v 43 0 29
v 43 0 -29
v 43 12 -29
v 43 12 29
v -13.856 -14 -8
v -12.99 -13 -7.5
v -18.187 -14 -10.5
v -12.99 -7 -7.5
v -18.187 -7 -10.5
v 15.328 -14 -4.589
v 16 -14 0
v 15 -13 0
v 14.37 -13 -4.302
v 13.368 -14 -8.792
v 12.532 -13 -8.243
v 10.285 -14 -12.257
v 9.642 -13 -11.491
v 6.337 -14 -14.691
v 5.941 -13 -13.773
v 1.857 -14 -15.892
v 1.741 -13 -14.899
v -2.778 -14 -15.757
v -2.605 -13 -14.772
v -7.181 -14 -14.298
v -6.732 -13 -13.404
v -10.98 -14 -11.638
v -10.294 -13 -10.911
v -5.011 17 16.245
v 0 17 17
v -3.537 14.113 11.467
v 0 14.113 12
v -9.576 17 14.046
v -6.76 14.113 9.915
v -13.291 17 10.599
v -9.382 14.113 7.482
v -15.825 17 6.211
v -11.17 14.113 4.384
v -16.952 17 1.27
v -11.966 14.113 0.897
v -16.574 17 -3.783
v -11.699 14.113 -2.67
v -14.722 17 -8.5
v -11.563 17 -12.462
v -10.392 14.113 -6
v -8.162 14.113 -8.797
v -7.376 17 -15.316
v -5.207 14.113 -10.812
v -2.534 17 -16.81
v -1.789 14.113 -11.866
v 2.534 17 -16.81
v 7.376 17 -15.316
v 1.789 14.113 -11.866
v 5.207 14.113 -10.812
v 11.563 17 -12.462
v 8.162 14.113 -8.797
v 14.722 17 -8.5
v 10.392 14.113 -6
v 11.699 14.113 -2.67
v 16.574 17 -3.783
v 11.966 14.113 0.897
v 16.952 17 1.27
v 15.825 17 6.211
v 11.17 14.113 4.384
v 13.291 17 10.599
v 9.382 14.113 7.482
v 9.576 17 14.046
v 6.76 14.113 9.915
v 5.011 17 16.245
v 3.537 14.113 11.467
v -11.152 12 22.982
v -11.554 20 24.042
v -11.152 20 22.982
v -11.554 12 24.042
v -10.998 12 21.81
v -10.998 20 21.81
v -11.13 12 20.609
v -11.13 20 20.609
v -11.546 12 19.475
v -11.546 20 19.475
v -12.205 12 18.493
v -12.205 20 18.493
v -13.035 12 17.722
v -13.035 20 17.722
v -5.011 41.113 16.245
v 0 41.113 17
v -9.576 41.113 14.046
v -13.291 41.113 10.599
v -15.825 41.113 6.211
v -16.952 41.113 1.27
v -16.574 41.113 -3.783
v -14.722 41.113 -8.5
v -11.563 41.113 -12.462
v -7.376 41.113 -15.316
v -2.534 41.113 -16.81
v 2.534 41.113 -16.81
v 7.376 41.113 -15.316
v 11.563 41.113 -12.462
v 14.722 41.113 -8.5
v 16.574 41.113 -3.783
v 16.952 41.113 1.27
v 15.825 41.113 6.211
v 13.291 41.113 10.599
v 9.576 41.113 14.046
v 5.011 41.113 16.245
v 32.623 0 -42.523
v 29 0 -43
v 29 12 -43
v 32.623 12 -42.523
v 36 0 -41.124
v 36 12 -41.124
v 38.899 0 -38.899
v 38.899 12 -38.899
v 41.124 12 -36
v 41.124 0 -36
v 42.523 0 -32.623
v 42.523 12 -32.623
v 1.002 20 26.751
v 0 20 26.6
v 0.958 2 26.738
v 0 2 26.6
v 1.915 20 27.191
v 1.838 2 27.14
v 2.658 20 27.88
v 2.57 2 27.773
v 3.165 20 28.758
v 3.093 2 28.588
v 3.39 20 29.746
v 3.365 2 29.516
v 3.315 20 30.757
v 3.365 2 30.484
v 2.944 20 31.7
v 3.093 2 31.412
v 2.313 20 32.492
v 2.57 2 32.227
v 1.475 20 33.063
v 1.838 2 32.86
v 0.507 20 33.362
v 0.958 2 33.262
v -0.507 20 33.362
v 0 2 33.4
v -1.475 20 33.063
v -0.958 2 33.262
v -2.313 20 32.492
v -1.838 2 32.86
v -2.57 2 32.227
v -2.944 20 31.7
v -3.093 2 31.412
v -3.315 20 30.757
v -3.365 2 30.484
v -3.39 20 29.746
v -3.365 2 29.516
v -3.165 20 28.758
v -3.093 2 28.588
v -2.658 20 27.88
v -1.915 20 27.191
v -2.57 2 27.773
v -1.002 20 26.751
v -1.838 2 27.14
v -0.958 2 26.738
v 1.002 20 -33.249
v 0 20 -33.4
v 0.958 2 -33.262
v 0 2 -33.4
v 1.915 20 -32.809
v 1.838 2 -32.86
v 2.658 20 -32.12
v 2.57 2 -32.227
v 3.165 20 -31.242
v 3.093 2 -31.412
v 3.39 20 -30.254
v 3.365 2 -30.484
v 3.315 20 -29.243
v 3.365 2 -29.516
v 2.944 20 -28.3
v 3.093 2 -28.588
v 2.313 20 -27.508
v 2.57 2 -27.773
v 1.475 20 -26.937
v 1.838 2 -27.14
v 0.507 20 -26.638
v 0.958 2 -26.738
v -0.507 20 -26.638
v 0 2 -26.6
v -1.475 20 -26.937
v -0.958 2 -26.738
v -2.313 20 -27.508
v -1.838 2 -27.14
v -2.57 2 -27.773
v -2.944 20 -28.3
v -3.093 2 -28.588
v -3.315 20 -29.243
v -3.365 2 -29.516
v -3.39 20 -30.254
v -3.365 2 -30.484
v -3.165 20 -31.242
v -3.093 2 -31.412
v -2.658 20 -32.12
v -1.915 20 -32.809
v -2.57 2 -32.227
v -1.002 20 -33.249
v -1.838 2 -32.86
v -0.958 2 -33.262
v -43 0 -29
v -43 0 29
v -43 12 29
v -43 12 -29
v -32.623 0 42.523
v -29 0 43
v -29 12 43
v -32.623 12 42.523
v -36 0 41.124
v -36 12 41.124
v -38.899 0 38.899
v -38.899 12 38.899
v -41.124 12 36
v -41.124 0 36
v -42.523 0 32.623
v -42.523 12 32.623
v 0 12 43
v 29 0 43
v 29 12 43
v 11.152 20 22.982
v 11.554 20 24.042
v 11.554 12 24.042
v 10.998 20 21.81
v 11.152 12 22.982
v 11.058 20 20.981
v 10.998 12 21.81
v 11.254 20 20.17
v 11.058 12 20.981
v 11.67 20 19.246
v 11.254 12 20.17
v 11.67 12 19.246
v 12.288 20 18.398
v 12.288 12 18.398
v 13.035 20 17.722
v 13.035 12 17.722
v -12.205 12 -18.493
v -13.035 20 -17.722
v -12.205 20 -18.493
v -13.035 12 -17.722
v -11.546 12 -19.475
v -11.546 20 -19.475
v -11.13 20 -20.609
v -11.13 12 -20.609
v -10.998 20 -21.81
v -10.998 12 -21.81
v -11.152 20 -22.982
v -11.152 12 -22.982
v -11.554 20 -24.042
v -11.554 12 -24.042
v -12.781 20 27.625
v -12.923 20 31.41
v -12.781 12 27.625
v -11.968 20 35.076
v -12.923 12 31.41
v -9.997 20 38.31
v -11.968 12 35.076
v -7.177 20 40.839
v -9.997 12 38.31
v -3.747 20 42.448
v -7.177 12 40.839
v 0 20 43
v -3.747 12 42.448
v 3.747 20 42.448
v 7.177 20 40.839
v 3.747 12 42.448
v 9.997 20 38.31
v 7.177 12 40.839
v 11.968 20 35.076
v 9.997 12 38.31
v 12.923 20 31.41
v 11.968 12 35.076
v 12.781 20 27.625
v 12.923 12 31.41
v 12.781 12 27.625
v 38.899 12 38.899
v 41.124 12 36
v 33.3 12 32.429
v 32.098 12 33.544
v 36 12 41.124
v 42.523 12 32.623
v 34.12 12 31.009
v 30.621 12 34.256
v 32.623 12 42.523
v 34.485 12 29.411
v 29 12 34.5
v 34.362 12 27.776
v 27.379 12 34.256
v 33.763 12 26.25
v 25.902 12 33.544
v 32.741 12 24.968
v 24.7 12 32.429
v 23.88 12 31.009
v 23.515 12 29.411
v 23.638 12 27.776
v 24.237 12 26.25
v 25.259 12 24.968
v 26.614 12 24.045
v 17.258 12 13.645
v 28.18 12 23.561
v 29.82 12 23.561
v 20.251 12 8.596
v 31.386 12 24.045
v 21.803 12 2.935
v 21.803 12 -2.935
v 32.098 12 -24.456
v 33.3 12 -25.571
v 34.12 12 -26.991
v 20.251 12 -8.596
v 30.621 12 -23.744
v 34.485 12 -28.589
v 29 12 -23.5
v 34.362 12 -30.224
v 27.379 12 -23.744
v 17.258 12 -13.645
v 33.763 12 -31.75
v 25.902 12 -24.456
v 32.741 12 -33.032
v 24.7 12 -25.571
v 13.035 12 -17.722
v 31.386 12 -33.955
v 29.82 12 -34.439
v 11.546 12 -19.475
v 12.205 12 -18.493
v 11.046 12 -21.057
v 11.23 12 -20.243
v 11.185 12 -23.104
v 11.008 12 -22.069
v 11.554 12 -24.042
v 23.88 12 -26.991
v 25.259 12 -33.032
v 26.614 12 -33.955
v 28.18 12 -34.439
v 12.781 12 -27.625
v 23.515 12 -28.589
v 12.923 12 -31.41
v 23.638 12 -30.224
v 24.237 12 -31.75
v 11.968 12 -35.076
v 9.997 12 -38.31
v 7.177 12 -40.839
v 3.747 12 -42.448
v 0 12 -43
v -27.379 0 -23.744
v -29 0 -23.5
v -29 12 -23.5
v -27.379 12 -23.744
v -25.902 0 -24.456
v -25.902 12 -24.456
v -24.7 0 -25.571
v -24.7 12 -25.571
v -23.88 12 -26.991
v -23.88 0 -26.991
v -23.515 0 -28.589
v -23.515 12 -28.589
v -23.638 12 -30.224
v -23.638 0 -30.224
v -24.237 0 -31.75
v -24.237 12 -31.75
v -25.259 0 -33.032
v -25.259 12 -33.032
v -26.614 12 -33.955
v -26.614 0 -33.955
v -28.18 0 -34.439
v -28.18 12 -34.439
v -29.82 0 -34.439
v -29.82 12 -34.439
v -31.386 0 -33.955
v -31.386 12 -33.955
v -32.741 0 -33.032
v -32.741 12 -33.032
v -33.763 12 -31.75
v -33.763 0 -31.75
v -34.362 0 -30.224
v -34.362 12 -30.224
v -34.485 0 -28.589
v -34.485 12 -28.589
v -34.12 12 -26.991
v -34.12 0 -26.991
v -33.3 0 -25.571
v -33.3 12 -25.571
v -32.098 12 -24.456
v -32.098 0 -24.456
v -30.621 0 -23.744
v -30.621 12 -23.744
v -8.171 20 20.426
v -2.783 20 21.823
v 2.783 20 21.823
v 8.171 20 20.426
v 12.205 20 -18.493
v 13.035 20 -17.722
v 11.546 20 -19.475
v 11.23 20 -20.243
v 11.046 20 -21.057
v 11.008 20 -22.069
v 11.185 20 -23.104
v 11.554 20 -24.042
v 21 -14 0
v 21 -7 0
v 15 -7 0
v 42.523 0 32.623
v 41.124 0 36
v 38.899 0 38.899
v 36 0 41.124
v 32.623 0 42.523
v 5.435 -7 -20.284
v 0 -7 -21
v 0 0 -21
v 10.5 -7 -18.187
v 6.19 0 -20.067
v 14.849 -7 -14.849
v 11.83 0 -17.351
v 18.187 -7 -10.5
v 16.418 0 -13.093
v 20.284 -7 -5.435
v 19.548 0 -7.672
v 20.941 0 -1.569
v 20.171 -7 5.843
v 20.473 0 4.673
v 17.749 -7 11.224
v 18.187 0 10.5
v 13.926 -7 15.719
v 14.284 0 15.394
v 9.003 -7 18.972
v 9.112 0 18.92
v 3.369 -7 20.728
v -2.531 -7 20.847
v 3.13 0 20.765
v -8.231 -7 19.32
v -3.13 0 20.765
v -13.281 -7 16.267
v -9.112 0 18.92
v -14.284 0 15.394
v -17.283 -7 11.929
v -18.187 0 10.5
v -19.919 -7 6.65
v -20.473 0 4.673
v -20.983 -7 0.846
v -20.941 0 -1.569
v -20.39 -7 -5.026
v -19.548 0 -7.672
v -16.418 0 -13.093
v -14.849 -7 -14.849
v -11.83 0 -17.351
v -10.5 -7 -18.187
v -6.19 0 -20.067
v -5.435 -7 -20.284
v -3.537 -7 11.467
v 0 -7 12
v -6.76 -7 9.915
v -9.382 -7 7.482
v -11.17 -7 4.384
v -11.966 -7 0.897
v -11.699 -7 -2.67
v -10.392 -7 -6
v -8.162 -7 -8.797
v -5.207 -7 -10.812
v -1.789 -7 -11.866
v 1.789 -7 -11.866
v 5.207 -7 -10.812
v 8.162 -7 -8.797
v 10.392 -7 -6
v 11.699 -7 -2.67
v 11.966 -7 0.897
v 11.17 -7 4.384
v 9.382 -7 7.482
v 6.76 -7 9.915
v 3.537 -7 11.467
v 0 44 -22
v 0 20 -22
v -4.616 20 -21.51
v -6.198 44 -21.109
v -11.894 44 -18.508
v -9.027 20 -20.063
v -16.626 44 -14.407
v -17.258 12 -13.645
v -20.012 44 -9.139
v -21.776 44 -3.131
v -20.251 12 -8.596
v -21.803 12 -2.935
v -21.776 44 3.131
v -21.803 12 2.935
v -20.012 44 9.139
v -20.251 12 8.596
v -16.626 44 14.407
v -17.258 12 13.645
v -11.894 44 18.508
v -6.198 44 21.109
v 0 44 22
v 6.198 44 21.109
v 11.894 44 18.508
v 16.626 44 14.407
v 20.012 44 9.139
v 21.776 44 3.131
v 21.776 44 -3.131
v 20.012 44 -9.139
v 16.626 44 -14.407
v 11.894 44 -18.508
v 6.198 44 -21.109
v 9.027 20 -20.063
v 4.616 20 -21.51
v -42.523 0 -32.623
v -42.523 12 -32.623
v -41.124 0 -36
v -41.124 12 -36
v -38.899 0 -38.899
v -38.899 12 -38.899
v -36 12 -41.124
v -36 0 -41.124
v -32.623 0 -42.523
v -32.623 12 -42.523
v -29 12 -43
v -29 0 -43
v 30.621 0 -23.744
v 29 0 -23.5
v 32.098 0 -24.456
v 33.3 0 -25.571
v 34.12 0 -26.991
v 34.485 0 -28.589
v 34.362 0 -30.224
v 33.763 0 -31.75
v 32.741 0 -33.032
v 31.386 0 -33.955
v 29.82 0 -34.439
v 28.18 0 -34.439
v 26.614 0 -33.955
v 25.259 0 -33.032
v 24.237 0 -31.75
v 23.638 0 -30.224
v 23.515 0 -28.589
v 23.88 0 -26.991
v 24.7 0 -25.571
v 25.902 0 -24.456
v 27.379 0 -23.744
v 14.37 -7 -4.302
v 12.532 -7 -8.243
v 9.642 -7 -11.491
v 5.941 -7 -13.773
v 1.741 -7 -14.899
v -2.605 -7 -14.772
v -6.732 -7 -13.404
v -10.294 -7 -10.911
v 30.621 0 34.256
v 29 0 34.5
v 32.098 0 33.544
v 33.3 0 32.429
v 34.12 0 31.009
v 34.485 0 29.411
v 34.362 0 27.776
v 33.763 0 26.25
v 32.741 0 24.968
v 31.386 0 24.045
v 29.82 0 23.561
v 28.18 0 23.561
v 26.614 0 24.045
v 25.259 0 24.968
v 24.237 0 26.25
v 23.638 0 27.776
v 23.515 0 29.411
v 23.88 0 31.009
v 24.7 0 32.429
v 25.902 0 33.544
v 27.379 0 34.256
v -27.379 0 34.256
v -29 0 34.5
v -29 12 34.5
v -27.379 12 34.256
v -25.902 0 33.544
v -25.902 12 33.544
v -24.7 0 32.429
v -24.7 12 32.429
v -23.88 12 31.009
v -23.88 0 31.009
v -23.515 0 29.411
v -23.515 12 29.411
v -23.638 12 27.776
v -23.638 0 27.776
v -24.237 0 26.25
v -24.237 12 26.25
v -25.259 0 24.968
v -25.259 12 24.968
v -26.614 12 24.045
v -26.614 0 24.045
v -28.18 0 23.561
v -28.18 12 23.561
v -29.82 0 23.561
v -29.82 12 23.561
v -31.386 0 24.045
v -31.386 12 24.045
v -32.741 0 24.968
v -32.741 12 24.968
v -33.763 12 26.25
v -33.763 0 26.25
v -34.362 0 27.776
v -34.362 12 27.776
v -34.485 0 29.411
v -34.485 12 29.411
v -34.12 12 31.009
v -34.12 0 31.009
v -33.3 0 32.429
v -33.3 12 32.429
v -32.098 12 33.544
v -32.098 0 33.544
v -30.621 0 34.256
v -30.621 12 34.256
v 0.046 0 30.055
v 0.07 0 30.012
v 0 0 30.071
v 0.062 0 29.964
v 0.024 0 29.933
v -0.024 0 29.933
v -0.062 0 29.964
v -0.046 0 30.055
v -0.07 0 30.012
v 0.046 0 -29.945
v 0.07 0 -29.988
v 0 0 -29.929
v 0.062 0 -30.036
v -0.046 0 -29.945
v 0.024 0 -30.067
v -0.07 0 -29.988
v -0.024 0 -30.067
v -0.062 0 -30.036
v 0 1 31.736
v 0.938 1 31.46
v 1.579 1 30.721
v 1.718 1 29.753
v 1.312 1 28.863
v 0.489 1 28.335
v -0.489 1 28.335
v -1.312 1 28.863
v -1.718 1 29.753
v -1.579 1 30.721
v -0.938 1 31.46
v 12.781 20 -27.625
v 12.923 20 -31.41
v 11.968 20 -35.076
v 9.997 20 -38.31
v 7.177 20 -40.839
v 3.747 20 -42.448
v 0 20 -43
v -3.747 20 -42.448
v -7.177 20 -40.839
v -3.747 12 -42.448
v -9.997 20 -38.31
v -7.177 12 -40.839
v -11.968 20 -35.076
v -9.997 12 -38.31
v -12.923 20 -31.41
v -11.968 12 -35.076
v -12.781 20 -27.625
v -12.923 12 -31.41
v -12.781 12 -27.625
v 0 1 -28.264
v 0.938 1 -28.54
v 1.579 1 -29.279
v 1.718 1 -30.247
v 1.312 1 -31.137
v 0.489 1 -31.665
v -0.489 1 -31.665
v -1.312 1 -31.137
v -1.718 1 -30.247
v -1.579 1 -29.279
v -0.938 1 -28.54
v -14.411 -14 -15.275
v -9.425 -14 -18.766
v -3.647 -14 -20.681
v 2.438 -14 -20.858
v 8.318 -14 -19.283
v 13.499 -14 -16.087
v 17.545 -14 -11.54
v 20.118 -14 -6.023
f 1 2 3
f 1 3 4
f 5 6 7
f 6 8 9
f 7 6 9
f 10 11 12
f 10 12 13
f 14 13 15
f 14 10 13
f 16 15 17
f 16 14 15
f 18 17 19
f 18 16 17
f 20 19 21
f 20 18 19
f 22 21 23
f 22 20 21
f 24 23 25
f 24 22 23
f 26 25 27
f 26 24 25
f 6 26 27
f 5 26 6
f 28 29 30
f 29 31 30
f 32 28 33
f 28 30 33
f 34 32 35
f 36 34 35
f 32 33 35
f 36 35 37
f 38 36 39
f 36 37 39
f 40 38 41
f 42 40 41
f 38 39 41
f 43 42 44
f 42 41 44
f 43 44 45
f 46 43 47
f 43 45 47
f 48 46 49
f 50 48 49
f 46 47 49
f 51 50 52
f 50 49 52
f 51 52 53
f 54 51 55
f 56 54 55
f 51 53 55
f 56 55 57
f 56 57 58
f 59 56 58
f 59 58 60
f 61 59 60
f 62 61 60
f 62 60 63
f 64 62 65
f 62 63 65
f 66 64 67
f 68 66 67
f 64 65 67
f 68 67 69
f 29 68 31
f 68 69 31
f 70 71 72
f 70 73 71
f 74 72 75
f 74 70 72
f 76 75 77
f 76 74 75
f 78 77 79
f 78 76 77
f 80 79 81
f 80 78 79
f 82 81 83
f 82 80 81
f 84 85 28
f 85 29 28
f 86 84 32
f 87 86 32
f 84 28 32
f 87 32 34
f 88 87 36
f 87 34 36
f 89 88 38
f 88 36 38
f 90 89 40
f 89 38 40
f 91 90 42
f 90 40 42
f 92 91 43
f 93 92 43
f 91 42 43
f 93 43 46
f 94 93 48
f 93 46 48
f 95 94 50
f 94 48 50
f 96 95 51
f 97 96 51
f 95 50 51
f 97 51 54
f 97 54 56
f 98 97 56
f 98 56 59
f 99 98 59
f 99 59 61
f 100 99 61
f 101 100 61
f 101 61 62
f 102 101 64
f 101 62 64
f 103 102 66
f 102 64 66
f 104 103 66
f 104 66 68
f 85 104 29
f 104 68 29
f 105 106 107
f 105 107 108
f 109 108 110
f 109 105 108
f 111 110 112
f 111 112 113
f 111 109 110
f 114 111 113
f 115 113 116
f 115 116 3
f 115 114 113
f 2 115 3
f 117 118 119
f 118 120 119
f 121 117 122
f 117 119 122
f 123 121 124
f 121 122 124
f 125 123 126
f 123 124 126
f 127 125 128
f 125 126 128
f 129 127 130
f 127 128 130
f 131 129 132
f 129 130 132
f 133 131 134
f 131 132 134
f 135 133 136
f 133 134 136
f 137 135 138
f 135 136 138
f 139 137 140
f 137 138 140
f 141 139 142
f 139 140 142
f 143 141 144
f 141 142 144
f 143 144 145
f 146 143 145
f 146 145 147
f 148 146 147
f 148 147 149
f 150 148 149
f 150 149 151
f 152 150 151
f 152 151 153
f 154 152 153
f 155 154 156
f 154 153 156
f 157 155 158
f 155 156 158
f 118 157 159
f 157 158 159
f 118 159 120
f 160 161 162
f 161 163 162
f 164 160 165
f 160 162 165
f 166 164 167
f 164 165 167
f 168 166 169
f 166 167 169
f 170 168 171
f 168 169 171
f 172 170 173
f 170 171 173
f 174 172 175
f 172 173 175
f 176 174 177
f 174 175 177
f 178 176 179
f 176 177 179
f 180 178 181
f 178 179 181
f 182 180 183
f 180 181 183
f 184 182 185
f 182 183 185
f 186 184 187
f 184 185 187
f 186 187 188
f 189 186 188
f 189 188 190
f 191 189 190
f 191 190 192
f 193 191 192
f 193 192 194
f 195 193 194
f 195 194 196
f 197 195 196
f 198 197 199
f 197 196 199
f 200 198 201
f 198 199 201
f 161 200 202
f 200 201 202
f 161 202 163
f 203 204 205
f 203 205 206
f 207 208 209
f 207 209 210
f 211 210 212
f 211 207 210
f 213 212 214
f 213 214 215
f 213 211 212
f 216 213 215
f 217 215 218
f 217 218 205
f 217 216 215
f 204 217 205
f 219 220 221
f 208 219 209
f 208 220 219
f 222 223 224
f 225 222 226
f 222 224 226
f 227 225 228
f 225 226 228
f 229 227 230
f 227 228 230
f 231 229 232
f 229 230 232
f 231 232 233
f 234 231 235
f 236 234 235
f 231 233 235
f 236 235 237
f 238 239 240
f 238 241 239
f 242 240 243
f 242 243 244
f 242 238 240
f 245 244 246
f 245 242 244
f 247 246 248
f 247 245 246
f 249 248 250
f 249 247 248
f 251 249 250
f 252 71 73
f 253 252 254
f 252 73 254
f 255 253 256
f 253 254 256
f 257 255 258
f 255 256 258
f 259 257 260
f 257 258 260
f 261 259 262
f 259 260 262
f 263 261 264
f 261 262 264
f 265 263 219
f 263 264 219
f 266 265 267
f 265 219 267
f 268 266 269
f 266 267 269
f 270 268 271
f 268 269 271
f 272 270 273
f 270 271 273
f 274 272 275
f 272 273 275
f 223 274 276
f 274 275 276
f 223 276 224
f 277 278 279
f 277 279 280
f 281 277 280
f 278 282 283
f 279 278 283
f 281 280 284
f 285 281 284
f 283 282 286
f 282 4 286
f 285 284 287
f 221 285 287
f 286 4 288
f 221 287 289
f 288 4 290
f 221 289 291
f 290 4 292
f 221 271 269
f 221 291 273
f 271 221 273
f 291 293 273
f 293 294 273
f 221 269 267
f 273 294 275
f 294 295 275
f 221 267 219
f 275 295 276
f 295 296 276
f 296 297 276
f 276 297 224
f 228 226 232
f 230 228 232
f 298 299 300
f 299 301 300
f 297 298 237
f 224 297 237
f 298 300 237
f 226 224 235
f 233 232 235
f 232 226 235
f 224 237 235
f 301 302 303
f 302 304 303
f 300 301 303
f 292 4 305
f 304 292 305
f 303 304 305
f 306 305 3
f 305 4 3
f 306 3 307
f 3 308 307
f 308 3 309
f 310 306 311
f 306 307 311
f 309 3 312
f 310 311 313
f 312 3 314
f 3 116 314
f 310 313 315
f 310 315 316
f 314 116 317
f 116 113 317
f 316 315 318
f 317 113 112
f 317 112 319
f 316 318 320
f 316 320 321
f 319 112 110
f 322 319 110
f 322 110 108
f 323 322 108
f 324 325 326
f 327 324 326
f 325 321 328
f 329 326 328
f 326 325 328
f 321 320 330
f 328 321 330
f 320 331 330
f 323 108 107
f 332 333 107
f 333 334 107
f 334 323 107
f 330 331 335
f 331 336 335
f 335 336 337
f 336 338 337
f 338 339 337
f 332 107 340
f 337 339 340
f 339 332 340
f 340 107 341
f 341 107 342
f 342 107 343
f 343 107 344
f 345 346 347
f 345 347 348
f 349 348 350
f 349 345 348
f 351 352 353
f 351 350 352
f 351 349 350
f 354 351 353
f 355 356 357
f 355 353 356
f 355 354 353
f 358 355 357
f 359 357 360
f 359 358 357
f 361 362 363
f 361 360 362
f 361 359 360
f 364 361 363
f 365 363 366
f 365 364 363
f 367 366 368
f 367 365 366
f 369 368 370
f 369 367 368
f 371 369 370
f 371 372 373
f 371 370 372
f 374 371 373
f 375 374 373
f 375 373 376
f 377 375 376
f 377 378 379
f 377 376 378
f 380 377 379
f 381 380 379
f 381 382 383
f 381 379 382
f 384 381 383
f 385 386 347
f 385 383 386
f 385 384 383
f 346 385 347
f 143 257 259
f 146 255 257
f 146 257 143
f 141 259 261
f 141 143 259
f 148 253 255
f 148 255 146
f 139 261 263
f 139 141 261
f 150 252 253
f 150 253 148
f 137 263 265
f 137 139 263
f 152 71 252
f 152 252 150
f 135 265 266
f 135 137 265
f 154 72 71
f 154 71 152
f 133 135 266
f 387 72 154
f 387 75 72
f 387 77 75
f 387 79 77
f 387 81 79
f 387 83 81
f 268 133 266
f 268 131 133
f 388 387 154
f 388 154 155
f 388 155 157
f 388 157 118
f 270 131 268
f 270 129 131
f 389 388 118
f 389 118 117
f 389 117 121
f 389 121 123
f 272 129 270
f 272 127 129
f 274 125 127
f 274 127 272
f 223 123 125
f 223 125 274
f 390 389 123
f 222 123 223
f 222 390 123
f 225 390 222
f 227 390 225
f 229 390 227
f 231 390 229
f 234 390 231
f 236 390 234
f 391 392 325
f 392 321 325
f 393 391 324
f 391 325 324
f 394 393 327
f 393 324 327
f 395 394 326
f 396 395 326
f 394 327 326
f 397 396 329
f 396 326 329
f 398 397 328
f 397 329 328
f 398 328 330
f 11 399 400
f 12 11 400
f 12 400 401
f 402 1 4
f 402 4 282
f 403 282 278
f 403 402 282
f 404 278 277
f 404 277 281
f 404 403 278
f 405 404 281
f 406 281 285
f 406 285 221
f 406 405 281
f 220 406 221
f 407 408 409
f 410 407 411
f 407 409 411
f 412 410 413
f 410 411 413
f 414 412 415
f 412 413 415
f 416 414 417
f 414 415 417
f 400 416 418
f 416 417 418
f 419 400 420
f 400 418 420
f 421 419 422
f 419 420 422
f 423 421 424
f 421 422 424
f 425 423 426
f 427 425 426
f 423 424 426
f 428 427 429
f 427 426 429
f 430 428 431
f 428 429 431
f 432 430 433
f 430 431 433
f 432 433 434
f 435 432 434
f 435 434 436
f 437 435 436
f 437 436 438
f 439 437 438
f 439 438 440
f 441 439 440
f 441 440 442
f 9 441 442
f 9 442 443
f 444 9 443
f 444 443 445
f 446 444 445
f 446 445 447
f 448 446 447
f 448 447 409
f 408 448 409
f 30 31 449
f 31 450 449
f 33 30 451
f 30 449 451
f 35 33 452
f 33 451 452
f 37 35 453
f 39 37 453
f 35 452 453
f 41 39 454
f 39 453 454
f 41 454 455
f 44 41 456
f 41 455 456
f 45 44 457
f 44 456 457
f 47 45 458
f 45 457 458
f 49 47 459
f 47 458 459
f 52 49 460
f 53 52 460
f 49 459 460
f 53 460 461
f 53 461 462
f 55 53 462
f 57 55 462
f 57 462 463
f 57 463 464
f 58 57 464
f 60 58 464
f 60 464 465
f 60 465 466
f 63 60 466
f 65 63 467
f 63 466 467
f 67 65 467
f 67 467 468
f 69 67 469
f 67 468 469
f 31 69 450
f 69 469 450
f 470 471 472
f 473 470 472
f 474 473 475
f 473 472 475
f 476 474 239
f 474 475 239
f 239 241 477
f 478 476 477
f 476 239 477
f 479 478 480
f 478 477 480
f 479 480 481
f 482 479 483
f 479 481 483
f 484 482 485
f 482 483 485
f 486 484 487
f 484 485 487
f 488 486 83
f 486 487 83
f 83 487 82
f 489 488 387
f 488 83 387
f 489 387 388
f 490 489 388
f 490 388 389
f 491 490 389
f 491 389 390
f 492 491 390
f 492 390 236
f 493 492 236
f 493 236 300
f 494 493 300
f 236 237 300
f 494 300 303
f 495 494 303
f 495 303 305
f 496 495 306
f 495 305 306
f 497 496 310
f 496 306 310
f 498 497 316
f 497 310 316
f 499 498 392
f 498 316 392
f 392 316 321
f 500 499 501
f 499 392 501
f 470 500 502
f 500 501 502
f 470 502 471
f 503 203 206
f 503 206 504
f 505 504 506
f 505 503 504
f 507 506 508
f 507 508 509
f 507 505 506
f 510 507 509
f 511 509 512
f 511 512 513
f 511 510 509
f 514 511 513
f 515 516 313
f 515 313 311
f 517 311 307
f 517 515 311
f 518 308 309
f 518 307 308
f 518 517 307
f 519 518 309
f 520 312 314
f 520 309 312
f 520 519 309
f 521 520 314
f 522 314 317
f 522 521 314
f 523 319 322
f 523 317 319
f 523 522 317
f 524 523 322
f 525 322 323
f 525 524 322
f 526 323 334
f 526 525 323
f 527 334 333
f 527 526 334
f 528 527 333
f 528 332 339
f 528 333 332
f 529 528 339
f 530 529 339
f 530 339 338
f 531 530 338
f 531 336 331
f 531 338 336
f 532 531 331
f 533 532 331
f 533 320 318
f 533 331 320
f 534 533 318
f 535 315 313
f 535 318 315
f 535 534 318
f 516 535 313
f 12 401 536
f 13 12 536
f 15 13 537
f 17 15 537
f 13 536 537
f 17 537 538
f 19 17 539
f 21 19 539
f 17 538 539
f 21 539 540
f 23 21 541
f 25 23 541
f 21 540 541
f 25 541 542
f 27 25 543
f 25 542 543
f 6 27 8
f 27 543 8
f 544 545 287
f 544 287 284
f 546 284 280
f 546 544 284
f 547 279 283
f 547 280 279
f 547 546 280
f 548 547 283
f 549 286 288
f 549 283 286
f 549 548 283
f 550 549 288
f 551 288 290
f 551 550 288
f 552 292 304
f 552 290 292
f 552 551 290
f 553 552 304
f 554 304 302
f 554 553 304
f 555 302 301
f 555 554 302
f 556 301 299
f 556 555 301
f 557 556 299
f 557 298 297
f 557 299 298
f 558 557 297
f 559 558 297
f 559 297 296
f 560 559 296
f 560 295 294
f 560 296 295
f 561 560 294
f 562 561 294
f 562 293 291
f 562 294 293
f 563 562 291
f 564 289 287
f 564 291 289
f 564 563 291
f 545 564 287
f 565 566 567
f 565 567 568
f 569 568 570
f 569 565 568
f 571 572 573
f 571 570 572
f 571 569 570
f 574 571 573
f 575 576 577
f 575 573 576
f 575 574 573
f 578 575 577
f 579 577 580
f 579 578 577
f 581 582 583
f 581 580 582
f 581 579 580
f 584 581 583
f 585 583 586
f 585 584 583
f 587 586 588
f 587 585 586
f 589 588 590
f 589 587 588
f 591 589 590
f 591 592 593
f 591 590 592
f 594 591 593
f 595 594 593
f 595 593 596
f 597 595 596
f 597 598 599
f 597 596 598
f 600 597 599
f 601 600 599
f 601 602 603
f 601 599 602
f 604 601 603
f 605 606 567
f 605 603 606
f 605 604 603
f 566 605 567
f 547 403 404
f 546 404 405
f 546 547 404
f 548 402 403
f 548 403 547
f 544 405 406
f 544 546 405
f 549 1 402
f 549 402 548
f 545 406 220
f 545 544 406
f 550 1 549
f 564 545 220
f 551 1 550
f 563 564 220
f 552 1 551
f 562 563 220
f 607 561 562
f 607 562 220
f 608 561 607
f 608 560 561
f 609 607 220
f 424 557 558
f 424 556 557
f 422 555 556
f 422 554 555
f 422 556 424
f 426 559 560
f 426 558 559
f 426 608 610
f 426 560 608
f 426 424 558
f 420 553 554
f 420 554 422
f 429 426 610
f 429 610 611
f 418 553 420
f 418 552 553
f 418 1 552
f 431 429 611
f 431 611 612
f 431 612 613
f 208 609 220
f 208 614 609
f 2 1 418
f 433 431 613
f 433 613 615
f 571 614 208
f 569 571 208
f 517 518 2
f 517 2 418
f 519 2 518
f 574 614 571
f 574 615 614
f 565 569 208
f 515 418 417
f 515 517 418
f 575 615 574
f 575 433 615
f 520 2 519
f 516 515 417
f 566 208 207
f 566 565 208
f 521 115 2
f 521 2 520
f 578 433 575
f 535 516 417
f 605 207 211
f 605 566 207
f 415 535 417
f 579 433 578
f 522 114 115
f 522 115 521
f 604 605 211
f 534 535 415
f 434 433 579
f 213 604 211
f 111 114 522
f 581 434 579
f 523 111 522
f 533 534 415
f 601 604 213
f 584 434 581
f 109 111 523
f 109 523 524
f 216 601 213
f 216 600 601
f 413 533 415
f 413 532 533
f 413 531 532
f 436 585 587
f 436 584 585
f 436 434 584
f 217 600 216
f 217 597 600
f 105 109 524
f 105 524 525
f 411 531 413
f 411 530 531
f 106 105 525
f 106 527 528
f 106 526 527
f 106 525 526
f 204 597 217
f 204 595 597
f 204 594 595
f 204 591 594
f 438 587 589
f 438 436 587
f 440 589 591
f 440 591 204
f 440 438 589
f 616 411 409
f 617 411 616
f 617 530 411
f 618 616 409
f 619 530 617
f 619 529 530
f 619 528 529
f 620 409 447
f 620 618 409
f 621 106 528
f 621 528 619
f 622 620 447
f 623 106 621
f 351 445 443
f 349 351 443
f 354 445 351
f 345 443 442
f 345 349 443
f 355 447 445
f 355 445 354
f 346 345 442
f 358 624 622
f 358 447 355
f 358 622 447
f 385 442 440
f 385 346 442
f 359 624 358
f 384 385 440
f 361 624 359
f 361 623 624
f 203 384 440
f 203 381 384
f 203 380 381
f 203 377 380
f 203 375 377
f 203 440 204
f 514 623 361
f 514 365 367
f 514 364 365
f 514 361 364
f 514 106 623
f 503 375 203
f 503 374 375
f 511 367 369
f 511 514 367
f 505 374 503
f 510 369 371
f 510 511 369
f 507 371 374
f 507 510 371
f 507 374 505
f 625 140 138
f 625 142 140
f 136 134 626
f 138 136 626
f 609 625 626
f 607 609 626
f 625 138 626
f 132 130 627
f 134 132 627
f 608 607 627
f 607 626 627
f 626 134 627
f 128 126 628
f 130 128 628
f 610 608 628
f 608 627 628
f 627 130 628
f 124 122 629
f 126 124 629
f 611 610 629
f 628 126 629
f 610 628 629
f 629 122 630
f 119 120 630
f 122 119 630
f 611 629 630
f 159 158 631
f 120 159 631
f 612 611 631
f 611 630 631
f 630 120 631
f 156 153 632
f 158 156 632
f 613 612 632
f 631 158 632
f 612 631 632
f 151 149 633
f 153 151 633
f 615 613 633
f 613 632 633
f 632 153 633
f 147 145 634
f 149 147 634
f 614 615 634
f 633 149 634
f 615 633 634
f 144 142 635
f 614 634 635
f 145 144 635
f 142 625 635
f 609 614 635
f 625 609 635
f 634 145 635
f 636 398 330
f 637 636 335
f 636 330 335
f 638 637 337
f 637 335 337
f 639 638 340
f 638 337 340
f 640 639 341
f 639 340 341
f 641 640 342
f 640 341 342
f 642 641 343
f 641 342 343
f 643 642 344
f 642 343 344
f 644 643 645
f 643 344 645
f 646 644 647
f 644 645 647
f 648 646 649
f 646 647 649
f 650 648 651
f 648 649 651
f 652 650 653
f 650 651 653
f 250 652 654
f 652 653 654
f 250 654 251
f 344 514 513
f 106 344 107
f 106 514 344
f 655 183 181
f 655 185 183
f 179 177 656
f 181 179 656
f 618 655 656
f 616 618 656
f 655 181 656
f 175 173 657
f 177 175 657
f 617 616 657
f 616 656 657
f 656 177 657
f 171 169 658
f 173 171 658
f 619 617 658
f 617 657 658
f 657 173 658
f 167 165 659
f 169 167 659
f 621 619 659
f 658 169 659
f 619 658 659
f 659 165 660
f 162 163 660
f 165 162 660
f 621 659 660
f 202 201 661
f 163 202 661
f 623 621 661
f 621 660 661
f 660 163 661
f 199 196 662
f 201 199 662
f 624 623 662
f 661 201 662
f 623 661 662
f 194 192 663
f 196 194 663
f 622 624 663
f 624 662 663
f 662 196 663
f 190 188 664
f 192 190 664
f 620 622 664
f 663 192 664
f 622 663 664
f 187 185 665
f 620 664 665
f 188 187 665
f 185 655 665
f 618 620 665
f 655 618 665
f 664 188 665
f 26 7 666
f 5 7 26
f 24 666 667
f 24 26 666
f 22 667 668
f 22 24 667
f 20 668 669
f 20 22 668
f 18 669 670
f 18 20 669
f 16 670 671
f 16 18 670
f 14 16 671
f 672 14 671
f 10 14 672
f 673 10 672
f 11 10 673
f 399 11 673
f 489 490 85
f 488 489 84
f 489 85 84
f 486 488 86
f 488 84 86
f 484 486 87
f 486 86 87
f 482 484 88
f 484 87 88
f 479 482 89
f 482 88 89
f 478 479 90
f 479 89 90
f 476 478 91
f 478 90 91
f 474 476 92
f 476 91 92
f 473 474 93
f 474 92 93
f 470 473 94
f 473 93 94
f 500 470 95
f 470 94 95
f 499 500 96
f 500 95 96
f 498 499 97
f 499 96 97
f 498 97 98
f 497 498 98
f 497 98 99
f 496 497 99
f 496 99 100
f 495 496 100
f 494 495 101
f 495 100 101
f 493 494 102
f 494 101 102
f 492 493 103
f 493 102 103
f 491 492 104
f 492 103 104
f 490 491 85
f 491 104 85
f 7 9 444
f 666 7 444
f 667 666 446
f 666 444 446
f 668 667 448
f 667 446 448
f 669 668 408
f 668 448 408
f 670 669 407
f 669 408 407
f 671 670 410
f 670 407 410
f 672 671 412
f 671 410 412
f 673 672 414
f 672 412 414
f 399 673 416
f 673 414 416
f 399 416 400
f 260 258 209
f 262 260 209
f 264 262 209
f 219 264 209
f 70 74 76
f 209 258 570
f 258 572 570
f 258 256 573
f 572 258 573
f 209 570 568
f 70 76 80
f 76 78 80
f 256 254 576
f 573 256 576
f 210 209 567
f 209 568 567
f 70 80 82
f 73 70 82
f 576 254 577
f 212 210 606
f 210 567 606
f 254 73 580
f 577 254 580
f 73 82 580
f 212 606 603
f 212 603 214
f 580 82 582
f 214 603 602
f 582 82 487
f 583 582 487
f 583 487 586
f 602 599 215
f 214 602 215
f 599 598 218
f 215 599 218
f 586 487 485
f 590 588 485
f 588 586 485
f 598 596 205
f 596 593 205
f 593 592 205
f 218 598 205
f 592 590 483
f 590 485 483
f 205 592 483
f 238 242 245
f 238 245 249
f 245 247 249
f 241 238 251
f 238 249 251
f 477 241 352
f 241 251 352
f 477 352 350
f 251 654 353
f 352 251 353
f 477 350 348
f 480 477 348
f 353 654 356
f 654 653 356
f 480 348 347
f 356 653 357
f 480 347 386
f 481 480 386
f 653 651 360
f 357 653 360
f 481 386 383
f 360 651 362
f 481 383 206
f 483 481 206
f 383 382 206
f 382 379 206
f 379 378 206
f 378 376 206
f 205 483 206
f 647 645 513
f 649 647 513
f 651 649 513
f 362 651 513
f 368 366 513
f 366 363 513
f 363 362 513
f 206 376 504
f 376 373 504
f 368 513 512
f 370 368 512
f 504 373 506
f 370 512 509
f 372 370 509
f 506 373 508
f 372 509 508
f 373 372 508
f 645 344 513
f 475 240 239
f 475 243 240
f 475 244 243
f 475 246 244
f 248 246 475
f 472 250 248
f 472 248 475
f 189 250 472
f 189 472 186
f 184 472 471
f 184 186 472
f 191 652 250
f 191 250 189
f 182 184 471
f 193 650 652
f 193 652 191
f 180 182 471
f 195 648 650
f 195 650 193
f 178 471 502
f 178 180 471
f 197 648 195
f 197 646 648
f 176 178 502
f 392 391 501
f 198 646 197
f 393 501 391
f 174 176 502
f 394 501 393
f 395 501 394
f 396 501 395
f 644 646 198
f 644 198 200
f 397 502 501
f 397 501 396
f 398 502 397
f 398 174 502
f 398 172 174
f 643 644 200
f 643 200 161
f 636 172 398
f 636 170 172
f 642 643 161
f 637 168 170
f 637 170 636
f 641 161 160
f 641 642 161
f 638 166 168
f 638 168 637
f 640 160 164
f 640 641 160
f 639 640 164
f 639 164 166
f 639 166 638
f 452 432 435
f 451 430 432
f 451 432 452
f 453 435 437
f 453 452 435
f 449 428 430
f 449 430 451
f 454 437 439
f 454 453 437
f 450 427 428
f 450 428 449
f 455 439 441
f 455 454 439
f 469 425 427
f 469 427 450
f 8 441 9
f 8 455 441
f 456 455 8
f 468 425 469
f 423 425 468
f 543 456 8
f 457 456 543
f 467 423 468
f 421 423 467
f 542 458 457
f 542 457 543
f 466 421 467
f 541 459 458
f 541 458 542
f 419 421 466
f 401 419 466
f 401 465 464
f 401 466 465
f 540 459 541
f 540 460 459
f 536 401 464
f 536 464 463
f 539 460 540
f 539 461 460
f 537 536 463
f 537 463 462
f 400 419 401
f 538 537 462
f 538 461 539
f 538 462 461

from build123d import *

# Parameters (mm, degrees)
EXTRUDE_1_DEPTH          = 12
CUT_EXTRUDE_1_DEPTH      = 62.983868869
CUT_EXTRUDE_1_DEPTH_BACK = 62.983868869
SKETCH_4_R               = 5.5
SKETCH_5_R               = 22
EXTRUDE_2_DEPTH          = 32
SKETCH_6_R               = 13
EXTRUDE_3_DEPTH          = 8
SKETCH_7_R               = 21
EXTRUDE_4_DEPTH          = 7
EXTRUDE_5_DEPTH          = 7
CHAMFER_1_SIZE           = 1
HOLE_WIZARD_M8_1_D       = 6.8
HOLE_WIZARD_M8_1_DEPTH   = 18
HOLE_WIZARD_M8_1_TIP     = 2.042926105
FILLET_1_R               = 5


with BuildPart() as part:
    # 草图2 → 凸台-拉伸1 (new body)
    with BuildSketch(Plane(origin=(0, 0, 0), x_dir=(1, 0, 0), z_dir=(0, 1, 0))):
        with BuildLine():
            Line((-29, 43), (29, 43))
            ThreePointArc((29, 43), (38.899494937, 38.899494937), (43, 29))
            Line((43, 29), (43, -29))
            ThreePointArc((43, -29), (38.899494937, -38.899494937), (29, -43))
            Line((29, -43), (-29, -43))
            ThreePointArc((-29, -43), (-38.899494937, -38.899494937), (-43, -29))
            Line((-43, -29), (-43, 29))
            ThreePointArc((-43, 29), (-38.899494937, 38.899494937), (-29, 43))
        make_face()
    extrude(amount=EXTRUDE_1_DEPTH)

    # 草图4 → 切除-拉伸1 (cut, two sides: drawn at the far end of the back side and taken through both)
    with BuildSketch(Plane(origin=(0, 12, 0), x_dir=(1, 0, 0), z_dir=(0, 1, 0)).offset(-CUT_EXTRUDE_1_DEPTH_BACK)):
        with Locations(Location((29, 29, 0), (0, 0, 270))):
            Circle(SKETCH_4_R)
        with Locations(Location((29, -29, 0), (0, 0, 270))):
            Circle(SKETCH_4_R)
        with Locations(Location((-29, -29, 0), (0, 0, 270))):
            Circle(SKETCH_4_R)
        with Locations(Location((-29, 29, 0), (0, 0, 270))):
            Circle(SKETCH_4_R)
    extrude(amount=CUT_EXTRUDE_1_DEPTH + CUT_EXTRUDE_1_DEPTH_BACK, mode=Mode.SUBTRACT)

    # 草图5 → 凸台-拉伸2 (add)
    with BuildSketch(Plane(origin=(0, 12, 0), x_dir=(1, 0, 0), z_dir=(0, 1, 0))):
        with Locations(Location((0, 0, 0), (0, 0, 90))):
            Circle(SKETCH_5_R)
    extrude(amount=EXTRUDE_2_DEPTH)

    # 草图6 → 凸台-拉伸3 (add)
    with BuildSketch(Plane(origin=(0, 12, 0), x_dir=(1, 0, 0), z_dir=(0, 1, 0))):
        with Locations((0, 30)):
            Circle(SKETCH_6_R)
        with Locations((0, -30)):
            Circle(SKETCH_6_R)
    extrude(amount=EXTRUDE_3_DEPTH)

    # 草图7 → 凸台-拉伸4 (add)
    with BuildSketch(Plane.XZ):
        with Locations(Location((0, 0, 0), (0, 0, 270))):
            Circle(SKETCH_7_R)
    extrude(amount=EXTRUDE_4_DEPTH)

    # 草图8 → 凸台-拉伸5 (add)
    with BuildSketch(Plane.XZ.offset(7)):
        with BuildLine():
            Line((21, 0), (15, 0))
            ThreePointArc((15, 0), (3.882285677, -14.488887394), (-12.990381057, -7.5))
            Line((-12.990381057, -7.5), (-18.186533479, -10.5))
            ThreePointArc((-18.186533479, -10.5), (5.435199947, -20.284442352), (21, 0))
        make_face()
    extrude(amount=EXTRUDE_5_DEPTH)

    # 倒角1
    chamfer_1_edges = [part.edges().sort_by_distance(p)[0] for p in [
        (3.882285677, -14, -14.488887394),
    ]]
    chamfer(chamfer_1_edges, length=CHAMFER_1_SIZE)

    # 草图9 → 切除-旋转1 (revolve, cut)
    with BuildSketch(Plane.XY, mode=Mode.PRIVATE) as cut_revolve_1_sk:
        Polygon((22, 44), (17, 41.113248654), (17, 17), (12, 14.113248654), (12, -7), (0, -7), (0, 44), align=None)
    revolve(cut_revolve_1_sk.sketch.rotate(Axis((0, 44, 0), (0, -1, 0)), 90), axis=Axis((0, 44, 0), (0, -1, 0)), mode=Mode.SUBTRACT)

    # M8 螺纹孔1
    with Locations(Plane(origin=(0, 20, -30), x_dir=(0, 0, 1), z_dir=(0, 1, 0))):
        with Locations((0, 0), (60, 0)):
            Hole(HOLE_WIZARD_M8_1_D / 2, depth=HOLE_WIZARD_M8_1_DEPTH)
            with Locations((0, 0, -(HOLE_WIZARD_M8_1_DEPTH + HOLE_WIZARD_M8_1_TIP / 2))):  # 118° drill point
                Cone(0, HOLE_WIZARD_M8_1_D / 2, HOLE_WIZARD_M8_1_TIP, mode=Mode.SUBTRACT)

    # 圆角1
    fillet_1_edges = [part.edges().sort_by_distance(p)[0] for p in [
        (-8.598691761, 16, -20.25),
        (8.598691761, 16, -20.25),
        (-8.598691761, 16, 20.25),
        (8.598691761, 16, 20.25),
    ]]
    fillet(fillet_1_edges, radius=FILLET_1_R)


solid = part.part
